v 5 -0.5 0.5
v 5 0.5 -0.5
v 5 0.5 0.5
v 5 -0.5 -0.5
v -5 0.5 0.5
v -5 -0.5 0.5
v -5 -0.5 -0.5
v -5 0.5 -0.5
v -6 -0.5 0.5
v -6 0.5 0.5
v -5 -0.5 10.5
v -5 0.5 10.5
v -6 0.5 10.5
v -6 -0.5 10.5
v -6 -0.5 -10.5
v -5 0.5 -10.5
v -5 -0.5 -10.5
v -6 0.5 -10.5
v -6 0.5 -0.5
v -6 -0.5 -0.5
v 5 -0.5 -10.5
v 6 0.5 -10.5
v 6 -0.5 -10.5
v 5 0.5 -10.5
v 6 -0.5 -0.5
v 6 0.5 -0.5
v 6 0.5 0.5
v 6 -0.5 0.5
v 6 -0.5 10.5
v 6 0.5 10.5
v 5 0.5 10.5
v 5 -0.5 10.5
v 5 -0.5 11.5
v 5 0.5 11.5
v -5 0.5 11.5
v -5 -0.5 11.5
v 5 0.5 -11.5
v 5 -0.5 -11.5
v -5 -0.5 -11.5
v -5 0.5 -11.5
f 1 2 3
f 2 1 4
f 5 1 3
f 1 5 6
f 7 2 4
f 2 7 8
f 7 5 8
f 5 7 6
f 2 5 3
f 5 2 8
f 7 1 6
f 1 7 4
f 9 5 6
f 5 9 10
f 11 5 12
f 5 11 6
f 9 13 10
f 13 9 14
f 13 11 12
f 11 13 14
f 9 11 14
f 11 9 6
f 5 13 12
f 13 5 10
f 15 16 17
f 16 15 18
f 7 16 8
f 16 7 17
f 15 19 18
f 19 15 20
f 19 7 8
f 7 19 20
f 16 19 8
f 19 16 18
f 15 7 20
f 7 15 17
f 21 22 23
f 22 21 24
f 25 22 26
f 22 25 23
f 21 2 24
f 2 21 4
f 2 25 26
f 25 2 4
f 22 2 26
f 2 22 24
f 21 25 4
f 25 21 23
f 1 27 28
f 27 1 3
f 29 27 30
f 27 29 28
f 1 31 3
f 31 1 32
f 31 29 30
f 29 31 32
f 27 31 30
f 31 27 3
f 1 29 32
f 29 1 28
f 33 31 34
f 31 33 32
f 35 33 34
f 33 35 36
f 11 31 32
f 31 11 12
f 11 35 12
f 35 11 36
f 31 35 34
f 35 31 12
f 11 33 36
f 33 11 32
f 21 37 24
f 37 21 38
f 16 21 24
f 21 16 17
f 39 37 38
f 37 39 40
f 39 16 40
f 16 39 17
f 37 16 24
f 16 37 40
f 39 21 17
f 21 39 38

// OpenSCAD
color("red")
rotate([0,-0,0])
cube([10,1,1], center = true);


translate([-5.5,0,5.5])
color("red")
rotate([0,90,0])
cube([10,1,1], center = true);


translate([-5.5,0,-5.5])
color("red")
rotate([0,90,0])
cube([10,1,1], center = true);

translate([5.5,0,-5.5])
color("red")
rotate([0,90,0])
cube([10,1,1], center = true);

translate([5.5,0,5.5])
color("red")
rotate([0,90,0])
cube([10,1,1], center = true);

translate([0,0,11])
color("red")
cube([10,1,1], center = true);

translate([0,0,-11])
color("red")
cube([10,1,1], center = true);
